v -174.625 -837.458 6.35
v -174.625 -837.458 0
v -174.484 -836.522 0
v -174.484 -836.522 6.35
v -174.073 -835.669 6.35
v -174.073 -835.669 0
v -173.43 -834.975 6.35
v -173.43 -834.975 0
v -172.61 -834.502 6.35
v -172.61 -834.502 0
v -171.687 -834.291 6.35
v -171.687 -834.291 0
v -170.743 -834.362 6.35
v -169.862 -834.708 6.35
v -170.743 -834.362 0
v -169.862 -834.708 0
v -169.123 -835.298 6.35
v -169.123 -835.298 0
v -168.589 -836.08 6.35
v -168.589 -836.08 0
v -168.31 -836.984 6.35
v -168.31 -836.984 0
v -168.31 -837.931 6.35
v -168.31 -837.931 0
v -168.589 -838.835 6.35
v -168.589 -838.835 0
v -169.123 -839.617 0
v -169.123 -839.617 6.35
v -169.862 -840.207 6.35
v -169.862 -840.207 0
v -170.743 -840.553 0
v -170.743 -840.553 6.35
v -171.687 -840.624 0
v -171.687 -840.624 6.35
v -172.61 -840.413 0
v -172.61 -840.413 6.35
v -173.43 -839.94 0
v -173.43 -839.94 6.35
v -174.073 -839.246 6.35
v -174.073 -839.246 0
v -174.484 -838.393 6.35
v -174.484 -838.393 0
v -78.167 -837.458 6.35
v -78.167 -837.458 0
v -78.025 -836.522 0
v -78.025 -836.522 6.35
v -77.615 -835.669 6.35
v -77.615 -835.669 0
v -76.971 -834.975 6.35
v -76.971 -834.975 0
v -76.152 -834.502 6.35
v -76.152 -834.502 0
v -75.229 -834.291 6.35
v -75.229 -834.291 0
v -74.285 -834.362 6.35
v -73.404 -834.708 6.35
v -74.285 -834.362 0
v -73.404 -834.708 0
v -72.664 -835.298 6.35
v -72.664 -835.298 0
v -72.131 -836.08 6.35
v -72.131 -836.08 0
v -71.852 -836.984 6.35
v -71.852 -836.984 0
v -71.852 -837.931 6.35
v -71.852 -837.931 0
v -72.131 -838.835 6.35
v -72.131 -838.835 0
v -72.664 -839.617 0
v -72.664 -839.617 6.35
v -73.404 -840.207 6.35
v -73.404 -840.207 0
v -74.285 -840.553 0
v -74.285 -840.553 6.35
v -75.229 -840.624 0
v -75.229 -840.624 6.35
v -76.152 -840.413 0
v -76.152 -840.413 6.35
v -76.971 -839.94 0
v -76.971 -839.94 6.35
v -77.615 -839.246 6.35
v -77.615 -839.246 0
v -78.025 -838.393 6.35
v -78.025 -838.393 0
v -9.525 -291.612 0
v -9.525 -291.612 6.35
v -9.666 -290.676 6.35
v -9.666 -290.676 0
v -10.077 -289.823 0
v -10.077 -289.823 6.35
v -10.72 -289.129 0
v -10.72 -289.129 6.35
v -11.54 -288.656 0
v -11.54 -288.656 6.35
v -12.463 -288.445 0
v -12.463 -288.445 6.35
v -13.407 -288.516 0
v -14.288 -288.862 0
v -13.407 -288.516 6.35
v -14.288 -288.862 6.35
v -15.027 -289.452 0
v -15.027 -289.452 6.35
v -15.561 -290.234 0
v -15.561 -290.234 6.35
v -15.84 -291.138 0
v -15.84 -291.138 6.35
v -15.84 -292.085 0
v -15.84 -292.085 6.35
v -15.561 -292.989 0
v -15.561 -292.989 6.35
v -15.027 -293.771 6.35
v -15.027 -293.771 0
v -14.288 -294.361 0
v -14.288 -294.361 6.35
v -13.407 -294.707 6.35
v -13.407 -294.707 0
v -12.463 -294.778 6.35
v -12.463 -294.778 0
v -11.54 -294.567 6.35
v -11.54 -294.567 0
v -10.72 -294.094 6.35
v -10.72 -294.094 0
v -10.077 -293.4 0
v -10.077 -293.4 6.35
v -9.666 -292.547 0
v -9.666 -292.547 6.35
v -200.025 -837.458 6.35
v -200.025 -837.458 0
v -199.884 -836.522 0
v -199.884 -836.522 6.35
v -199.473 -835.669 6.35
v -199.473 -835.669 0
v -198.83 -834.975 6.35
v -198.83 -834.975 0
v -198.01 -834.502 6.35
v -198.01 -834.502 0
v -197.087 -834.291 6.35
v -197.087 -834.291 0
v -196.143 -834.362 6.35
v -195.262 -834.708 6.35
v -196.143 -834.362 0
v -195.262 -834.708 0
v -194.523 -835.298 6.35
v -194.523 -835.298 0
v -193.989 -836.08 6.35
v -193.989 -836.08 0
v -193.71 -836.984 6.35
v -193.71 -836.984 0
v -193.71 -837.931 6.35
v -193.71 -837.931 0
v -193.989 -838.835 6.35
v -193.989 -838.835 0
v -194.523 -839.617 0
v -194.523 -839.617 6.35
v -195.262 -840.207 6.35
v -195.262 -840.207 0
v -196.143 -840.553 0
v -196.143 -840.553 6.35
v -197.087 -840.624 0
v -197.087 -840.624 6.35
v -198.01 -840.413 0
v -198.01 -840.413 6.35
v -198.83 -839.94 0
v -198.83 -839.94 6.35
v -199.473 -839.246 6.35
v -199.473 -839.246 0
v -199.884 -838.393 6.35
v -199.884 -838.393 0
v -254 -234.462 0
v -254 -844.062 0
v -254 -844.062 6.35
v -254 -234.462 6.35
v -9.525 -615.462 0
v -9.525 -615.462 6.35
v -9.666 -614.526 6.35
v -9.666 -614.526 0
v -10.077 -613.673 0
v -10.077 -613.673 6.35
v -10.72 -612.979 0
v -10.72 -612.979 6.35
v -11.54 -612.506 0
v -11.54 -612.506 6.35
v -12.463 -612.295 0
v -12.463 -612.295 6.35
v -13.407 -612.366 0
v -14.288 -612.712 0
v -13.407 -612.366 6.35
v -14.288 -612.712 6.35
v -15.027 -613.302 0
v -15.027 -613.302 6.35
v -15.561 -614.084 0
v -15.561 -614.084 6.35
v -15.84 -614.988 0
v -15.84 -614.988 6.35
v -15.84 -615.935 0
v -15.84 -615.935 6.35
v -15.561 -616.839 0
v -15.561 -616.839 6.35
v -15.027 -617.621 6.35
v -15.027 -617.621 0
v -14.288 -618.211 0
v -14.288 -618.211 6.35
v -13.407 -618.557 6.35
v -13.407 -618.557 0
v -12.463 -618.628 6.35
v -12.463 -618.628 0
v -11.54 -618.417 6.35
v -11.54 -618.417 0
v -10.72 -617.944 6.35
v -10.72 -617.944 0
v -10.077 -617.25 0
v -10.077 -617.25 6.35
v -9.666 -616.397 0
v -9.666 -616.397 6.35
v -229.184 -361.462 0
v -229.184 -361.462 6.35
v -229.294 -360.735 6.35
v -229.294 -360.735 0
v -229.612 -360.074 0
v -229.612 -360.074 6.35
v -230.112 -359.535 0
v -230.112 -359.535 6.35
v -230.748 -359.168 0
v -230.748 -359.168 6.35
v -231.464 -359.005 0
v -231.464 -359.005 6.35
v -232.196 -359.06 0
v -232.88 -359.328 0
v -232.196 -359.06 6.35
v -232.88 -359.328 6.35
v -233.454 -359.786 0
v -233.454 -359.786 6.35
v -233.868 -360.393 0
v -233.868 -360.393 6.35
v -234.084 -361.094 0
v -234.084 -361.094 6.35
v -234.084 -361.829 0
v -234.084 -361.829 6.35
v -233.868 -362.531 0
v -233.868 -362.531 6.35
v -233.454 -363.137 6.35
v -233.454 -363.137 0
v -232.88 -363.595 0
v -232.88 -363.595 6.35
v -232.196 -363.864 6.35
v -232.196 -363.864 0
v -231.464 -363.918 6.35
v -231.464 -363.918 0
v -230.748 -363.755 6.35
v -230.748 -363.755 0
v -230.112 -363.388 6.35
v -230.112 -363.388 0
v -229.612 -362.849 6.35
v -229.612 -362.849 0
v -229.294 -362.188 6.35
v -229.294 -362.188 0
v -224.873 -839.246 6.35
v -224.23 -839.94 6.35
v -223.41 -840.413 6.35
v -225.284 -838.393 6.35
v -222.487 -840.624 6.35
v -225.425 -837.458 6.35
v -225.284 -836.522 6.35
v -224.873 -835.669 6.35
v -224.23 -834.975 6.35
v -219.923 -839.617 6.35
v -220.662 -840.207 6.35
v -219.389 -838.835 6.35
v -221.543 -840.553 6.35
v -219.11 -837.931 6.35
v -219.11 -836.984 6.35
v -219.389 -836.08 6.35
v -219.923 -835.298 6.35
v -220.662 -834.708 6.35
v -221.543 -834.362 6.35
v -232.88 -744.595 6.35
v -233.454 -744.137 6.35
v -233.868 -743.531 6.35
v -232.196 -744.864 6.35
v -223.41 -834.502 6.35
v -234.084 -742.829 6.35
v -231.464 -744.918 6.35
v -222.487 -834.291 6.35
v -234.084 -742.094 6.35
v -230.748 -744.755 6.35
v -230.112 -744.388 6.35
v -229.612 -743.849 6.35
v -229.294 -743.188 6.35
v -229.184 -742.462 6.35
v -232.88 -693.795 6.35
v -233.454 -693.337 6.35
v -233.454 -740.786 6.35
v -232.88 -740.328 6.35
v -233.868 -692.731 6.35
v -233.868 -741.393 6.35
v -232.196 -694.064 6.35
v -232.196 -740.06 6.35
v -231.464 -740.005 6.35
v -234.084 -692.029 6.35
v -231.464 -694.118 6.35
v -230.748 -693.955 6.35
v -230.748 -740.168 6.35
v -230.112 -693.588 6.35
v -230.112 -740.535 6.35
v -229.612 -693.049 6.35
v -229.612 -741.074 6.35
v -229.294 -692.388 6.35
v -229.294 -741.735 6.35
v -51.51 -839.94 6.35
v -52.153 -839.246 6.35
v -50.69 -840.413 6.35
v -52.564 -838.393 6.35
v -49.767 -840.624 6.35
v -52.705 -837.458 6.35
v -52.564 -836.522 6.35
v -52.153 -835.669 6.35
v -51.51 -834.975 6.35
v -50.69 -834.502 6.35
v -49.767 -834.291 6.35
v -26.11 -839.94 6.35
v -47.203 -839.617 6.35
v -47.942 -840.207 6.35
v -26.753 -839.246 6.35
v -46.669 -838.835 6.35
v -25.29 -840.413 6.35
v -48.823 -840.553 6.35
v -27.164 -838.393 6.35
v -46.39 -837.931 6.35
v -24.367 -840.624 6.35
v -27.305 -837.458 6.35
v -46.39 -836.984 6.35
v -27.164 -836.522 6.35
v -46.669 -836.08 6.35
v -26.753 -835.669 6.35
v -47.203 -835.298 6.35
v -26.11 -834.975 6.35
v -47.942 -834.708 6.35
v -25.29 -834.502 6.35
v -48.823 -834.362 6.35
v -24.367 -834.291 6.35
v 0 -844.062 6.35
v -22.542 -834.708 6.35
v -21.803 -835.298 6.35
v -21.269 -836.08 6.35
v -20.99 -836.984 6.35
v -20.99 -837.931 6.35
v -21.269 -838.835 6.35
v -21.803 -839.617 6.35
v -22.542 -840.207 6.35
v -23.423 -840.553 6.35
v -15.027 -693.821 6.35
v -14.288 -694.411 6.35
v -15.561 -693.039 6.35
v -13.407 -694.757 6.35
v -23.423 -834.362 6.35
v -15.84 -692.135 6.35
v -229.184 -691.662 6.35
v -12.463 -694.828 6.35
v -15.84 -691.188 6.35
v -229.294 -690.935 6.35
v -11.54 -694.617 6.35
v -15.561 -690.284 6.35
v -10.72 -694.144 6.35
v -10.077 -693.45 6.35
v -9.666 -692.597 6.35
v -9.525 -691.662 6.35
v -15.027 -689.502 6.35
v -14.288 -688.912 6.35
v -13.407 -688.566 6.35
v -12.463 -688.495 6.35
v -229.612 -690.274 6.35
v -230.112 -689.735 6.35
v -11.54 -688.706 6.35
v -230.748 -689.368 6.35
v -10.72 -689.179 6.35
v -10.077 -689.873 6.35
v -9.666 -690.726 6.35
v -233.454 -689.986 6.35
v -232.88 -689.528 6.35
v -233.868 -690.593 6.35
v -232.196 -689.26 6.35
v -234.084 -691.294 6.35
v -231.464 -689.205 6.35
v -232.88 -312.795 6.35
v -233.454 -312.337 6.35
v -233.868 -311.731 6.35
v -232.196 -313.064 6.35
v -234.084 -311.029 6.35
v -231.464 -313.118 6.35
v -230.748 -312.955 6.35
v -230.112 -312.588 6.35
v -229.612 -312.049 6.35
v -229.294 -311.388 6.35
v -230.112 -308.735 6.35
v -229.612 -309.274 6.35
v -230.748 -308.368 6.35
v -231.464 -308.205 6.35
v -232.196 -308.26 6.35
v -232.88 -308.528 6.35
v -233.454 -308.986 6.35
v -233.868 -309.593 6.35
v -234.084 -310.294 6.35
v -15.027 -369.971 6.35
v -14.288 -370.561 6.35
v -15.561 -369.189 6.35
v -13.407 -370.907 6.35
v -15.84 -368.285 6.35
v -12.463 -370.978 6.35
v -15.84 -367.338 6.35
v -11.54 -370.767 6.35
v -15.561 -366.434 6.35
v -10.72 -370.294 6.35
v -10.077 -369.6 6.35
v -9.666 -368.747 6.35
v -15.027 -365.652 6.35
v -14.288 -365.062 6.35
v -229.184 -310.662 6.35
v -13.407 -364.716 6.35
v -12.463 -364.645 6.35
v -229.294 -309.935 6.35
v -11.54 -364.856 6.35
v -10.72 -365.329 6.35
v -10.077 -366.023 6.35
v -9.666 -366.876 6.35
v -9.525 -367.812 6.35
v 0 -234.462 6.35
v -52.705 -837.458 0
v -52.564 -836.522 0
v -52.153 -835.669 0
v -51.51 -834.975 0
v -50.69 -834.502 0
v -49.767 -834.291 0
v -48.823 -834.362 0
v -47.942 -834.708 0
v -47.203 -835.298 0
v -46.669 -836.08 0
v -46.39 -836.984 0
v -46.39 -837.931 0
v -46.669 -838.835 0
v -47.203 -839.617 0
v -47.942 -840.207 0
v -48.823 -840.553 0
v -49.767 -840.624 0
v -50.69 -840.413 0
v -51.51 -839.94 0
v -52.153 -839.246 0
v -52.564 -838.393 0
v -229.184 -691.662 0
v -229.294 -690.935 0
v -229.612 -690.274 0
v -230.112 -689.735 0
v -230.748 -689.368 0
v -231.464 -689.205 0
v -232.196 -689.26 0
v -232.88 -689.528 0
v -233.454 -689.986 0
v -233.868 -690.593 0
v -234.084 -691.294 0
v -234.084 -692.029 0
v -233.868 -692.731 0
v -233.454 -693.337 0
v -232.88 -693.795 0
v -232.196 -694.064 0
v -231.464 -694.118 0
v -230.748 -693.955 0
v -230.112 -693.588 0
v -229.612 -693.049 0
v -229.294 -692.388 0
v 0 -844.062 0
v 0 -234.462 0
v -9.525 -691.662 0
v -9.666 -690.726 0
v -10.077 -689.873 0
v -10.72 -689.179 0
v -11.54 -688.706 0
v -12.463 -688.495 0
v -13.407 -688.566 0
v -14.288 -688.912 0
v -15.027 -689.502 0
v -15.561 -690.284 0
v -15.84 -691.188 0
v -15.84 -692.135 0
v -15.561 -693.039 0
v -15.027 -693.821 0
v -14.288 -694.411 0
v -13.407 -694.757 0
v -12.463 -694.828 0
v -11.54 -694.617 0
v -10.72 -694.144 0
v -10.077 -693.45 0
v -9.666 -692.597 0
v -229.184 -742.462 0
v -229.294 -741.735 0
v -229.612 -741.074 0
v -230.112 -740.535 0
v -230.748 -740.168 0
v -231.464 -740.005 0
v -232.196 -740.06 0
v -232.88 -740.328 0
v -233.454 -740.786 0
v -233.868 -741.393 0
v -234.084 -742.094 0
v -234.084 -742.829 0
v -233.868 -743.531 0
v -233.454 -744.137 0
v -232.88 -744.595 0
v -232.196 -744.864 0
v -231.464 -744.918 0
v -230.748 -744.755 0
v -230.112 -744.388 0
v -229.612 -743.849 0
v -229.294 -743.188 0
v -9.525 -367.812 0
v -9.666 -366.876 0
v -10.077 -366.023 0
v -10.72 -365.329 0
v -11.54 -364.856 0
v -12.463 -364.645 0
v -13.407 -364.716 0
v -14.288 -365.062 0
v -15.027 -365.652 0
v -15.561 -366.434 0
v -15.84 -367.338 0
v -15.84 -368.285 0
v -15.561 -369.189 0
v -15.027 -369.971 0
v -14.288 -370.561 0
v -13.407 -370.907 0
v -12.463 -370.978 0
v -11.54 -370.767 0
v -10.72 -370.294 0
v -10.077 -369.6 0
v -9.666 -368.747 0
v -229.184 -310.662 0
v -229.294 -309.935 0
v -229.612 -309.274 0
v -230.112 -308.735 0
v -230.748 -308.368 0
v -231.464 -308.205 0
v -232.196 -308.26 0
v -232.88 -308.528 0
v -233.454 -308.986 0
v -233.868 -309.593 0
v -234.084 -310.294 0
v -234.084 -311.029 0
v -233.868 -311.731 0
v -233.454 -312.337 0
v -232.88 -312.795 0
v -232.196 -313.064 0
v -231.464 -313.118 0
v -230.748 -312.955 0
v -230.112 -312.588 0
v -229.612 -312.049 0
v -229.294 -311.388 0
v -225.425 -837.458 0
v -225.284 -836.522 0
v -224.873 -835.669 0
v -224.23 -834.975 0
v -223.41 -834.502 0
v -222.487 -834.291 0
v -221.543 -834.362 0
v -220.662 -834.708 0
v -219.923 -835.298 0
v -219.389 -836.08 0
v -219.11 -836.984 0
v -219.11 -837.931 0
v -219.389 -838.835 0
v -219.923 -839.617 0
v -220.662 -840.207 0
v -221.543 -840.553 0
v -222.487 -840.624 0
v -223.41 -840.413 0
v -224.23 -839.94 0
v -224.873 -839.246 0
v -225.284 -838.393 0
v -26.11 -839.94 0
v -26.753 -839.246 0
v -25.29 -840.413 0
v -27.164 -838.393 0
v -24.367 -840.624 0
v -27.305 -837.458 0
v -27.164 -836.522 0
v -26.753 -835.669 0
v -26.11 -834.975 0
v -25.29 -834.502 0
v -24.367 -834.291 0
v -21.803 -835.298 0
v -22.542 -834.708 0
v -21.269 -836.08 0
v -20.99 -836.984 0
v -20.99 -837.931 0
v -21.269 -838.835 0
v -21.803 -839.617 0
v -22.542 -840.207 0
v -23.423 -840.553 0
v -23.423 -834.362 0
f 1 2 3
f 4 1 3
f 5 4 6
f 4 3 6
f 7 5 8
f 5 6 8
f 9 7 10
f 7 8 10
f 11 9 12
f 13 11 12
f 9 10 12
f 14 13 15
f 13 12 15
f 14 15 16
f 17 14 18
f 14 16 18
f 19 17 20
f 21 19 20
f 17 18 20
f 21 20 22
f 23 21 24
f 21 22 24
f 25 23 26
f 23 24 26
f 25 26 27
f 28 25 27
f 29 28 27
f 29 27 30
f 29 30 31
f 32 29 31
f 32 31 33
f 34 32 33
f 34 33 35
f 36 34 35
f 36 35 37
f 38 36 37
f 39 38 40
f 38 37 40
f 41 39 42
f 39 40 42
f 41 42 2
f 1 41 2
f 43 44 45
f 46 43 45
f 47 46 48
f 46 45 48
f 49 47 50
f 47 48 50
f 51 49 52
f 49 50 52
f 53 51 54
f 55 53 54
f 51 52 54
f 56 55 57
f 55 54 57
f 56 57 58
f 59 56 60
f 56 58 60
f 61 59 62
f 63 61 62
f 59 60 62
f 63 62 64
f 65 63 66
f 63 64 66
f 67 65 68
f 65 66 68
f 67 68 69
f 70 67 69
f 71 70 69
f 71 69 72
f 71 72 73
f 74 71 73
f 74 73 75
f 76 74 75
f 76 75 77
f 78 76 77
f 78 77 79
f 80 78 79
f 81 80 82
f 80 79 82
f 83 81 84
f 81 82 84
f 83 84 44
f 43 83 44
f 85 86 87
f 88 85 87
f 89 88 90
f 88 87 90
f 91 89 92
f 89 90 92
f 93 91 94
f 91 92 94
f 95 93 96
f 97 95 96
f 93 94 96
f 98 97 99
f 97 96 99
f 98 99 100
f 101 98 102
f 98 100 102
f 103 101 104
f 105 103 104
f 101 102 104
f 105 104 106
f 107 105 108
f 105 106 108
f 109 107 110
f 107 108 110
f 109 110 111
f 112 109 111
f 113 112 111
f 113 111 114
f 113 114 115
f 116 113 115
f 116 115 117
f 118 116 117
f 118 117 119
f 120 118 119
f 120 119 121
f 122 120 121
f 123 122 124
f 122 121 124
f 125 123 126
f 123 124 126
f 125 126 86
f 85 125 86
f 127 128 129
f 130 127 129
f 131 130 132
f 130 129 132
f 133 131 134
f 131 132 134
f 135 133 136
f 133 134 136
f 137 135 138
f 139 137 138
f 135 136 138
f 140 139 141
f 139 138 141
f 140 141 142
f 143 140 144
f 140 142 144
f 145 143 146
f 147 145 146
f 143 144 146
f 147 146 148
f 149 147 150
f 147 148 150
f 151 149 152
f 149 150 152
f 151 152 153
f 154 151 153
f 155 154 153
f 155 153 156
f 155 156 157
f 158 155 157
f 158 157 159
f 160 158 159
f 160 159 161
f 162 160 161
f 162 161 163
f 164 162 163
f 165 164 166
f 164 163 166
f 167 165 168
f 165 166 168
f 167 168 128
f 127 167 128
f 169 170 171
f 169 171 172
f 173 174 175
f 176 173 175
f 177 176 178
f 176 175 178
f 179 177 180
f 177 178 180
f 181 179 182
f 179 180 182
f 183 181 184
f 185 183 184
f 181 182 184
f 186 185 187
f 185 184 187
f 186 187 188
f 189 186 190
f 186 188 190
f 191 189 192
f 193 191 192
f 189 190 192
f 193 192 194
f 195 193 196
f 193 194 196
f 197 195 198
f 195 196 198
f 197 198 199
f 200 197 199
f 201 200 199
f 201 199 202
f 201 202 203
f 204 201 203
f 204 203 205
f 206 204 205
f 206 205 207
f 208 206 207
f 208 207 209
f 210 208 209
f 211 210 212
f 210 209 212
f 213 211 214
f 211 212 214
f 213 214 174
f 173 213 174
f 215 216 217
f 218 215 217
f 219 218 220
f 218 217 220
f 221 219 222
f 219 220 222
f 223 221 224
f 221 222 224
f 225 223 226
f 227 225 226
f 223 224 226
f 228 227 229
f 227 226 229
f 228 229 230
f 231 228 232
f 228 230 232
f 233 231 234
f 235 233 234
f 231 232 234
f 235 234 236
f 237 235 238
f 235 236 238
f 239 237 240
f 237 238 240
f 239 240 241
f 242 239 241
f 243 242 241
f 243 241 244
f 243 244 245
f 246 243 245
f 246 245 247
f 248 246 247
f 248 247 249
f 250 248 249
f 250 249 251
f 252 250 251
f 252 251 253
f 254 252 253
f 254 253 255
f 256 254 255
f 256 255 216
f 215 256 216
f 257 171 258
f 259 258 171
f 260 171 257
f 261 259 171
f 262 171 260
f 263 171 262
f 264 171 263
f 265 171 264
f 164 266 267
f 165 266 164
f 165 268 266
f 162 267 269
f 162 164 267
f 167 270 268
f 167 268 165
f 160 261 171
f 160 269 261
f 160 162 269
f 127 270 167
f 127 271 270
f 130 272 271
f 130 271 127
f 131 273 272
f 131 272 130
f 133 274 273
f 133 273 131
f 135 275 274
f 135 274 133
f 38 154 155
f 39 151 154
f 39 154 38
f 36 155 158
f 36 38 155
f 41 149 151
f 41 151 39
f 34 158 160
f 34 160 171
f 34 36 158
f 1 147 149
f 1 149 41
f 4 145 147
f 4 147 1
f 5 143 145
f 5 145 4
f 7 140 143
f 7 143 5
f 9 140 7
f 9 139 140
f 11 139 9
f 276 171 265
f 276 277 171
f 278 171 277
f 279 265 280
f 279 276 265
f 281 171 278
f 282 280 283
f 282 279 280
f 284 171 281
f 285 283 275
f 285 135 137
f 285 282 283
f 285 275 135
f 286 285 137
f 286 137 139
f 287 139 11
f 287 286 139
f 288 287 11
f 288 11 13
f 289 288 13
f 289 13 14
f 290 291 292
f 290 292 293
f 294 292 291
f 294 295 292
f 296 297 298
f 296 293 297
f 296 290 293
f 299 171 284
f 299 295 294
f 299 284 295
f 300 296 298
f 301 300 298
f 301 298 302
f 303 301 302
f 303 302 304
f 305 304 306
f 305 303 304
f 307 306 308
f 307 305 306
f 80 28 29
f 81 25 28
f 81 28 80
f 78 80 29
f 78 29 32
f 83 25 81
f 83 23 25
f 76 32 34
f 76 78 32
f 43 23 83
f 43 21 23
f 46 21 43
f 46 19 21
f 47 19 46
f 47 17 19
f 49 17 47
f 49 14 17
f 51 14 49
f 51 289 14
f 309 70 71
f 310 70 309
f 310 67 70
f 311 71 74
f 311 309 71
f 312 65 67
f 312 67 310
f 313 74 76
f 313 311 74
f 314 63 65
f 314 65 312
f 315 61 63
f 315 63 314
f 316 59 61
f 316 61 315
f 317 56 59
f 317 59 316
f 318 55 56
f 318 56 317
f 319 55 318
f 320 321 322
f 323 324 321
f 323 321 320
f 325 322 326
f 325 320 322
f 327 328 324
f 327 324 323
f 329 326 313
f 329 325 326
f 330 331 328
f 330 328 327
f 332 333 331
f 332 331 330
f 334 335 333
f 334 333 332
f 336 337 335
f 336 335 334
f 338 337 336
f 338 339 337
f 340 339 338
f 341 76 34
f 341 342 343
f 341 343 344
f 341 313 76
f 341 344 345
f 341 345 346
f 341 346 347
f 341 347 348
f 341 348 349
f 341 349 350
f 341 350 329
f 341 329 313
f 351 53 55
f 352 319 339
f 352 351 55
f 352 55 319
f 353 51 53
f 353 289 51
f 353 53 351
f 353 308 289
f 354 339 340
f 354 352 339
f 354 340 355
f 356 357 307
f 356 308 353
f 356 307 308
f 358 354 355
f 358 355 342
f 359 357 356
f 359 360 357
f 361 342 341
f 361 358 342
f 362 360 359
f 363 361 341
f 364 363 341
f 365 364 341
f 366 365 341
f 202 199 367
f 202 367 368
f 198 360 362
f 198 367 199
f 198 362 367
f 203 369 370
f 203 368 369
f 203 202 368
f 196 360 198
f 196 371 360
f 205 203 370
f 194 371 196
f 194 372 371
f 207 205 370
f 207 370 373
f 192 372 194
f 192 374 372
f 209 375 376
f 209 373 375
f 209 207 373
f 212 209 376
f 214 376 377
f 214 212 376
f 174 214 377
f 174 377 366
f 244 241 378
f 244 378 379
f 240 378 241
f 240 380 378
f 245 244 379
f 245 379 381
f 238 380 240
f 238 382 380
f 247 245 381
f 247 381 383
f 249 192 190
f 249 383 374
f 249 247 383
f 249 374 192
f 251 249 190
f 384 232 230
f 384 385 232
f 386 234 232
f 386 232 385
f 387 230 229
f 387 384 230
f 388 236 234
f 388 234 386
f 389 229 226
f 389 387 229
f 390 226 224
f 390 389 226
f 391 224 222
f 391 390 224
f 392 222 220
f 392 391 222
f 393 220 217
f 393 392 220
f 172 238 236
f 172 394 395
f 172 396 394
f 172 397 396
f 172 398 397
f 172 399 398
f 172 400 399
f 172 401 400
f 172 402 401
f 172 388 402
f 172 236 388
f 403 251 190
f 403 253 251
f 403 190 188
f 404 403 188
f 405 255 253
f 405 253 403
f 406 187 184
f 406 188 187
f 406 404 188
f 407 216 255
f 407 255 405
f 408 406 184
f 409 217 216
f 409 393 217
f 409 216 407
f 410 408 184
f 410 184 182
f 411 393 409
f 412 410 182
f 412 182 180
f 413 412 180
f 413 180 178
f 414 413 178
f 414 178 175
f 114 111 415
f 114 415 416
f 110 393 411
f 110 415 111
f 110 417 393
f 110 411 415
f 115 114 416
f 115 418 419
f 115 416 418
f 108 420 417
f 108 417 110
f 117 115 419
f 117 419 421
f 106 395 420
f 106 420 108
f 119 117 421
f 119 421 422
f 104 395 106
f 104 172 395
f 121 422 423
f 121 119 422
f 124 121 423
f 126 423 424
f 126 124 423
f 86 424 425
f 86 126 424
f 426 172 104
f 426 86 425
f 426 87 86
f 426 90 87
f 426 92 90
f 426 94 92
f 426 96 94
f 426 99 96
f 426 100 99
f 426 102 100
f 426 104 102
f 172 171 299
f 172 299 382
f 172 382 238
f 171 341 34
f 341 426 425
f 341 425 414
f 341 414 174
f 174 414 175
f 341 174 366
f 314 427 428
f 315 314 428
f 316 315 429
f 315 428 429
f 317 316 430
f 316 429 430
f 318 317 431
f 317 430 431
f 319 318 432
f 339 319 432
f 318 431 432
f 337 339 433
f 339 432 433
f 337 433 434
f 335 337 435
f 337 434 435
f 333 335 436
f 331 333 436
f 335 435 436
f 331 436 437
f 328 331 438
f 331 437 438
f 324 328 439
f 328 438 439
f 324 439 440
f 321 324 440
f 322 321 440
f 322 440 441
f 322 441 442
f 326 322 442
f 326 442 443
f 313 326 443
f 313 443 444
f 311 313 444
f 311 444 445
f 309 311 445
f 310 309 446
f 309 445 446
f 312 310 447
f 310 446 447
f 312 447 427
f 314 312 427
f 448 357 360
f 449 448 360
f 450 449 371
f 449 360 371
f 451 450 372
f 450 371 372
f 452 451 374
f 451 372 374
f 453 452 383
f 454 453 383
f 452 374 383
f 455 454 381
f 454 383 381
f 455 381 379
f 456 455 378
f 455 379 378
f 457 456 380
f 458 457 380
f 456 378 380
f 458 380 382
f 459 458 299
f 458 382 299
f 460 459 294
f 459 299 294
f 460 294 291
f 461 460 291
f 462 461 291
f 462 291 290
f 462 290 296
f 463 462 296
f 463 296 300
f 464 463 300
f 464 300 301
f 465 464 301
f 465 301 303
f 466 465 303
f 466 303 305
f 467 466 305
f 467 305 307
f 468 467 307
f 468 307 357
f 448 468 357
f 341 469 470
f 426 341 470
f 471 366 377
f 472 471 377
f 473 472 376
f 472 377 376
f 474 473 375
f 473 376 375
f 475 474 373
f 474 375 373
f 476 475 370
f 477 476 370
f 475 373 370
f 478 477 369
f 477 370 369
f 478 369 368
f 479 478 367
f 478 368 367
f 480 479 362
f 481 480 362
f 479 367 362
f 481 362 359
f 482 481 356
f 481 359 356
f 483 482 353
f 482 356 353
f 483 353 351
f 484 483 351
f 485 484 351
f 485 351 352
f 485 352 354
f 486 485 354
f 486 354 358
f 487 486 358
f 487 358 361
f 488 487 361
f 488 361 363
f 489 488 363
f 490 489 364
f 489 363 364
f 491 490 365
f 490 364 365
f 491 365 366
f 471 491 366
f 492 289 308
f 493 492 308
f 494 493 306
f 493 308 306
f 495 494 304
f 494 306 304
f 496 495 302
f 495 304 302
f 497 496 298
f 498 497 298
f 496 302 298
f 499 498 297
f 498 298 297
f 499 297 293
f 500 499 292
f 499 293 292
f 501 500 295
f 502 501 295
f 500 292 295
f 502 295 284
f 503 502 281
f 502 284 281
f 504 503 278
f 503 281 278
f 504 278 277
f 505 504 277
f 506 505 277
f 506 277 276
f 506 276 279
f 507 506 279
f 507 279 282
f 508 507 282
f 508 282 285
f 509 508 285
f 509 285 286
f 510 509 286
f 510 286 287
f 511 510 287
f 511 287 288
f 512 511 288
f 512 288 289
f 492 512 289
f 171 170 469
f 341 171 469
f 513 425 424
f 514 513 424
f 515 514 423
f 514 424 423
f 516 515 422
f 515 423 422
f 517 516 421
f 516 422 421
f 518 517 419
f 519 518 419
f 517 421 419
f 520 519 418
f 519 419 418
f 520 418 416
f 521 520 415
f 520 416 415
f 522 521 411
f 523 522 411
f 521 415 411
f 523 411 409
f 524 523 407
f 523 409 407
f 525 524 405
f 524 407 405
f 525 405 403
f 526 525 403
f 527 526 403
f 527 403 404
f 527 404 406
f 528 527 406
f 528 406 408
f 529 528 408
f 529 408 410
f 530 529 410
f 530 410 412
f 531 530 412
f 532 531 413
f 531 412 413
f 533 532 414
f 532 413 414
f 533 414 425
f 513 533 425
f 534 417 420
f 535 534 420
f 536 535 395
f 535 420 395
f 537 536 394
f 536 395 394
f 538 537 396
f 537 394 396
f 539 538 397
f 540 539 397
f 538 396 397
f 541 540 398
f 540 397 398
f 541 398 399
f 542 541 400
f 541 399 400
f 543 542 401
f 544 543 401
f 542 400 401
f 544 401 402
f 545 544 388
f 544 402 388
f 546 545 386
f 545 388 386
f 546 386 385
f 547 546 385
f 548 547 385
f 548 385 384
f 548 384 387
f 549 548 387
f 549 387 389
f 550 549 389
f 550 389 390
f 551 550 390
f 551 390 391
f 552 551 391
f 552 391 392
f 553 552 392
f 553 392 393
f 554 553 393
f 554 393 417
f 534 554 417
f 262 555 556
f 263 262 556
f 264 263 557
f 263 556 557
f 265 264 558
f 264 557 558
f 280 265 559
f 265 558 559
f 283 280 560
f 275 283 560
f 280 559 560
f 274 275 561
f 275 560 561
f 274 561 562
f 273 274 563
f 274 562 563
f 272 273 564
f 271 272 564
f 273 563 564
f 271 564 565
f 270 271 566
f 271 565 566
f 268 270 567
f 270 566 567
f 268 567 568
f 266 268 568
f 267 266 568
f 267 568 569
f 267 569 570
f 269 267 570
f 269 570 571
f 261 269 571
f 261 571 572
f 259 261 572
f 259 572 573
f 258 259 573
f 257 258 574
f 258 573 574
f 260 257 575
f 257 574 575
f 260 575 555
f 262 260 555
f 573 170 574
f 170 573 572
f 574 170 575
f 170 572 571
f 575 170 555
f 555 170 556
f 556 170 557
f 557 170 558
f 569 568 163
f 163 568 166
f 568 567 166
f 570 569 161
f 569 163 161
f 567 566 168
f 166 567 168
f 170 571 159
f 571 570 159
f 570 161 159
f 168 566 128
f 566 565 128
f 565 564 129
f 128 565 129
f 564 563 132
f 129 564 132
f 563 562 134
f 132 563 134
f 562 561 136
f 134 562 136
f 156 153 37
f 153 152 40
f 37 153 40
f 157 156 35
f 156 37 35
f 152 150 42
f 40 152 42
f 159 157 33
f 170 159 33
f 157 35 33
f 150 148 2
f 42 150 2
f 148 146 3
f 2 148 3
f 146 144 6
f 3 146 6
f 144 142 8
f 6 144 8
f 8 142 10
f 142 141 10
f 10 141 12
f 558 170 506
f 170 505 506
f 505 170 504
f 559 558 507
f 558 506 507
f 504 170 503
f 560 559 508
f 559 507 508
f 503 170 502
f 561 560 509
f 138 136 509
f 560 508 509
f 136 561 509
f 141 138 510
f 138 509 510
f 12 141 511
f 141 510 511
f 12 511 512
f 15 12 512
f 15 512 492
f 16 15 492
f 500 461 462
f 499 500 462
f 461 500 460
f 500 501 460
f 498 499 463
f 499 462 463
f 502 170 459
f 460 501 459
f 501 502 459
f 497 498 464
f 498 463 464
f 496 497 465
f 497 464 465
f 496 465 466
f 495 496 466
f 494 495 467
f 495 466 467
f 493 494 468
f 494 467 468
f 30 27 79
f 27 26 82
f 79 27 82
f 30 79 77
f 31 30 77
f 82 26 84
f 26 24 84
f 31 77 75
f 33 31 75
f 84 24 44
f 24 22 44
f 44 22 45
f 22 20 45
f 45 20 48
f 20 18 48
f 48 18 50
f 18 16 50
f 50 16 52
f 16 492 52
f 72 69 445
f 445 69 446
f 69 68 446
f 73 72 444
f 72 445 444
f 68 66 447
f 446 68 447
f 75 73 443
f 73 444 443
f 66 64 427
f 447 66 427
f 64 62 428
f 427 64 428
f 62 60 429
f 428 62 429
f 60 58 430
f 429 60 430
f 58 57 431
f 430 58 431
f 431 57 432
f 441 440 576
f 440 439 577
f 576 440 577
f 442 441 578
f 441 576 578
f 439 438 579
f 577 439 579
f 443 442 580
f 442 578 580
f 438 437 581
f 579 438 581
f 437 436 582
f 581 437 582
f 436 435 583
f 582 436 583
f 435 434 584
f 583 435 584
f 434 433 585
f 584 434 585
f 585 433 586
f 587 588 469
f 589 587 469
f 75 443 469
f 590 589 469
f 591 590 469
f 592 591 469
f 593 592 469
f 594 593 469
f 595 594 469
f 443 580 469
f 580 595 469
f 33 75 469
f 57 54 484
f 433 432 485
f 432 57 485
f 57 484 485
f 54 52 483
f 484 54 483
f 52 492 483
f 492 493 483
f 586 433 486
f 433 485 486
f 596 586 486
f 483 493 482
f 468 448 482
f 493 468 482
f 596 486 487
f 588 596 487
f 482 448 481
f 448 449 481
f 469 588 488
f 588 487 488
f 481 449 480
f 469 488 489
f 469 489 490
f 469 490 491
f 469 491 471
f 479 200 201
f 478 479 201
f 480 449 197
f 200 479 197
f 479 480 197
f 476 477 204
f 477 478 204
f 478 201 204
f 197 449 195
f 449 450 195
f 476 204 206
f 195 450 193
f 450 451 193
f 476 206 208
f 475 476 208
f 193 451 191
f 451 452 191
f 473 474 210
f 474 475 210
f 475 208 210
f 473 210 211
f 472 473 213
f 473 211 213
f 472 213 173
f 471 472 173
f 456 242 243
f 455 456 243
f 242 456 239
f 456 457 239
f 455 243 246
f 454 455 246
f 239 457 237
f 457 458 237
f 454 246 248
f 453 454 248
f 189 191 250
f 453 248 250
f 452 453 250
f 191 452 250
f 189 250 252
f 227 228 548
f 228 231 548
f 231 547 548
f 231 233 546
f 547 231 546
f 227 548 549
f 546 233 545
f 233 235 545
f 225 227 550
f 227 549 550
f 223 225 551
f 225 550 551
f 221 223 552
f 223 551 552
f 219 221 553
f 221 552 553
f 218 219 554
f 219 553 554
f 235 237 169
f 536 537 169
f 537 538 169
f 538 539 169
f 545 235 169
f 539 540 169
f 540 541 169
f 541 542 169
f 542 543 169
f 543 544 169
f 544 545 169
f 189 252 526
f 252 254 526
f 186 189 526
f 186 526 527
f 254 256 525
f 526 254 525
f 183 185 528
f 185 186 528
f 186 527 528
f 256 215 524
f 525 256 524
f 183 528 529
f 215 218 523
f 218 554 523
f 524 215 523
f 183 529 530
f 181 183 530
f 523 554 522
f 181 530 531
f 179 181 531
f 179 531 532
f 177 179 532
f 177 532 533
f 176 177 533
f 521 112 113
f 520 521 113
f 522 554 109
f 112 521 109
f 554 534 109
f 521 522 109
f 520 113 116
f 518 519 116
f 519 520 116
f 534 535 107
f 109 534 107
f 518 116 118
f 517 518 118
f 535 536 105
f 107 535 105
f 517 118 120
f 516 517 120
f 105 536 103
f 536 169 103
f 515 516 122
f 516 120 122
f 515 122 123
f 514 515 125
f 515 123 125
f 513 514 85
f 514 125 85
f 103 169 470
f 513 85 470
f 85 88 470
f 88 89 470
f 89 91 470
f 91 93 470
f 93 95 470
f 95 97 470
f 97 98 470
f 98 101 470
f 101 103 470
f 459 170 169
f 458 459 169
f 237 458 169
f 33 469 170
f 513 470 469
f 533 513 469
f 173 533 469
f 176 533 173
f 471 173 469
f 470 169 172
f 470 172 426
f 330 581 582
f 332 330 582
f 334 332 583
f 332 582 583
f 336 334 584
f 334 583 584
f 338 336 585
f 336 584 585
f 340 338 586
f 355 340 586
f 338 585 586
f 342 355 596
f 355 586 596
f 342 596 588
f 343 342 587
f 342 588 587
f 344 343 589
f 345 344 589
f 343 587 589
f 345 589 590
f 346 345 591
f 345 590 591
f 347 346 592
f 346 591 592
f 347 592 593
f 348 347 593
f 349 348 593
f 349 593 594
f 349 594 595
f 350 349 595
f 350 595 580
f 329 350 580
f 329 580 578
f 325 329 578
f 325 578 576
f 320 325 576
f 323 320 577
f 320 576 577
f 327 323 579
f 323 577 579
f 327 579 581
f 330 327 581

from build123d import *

# Parameters (mm, degrees)
SKETCH1_W           = 254
SKETCH1_H           = 609.6
BOSS_EXTRUDE1_DEPTH = 6.35
SKETCH2_R           = 2.4638
CUT_EXTRUDE1_DEPTH  = 7.35
SKETCH3_R           = 3.175
CUT_EXTRUDE2_DEPTH  = 6.35
SKETCH4_R           = 3.175
CUT_EXTRUDE3_DEPTH  = 6.35


with BuildPart() as part:
    # Sketch1 → Boss-Extrude1 (new body)
    with BuildSketch(Plane.XY):
        with Locations((-127, -539.261538462)):
            Rectangle(SKETCH1_W, SKETCH1_H)
    extrude(amount=BOSS_EXTRUDE1_DEPTH)

    # Sketch2 → Cut-Extrude1 (cut, through all)
    with BuildSketch(Plane.XY.offset(6.35)):
        with Locations((-231.648, -310.661538462)):
            Circle(SKETCH2_R)
        with Locations((-231.648, -361.461538462)):
            Circle(SKETCH2_R)
        with Locations((-231.648, -691.661538462)):
            Circle(SKETCH2_R)
        with Locations((-231.648, -742.461538462)):
            Circle(SKETCH2_R)
    extrude(amount=-CUT_EXTRUDE1_DEPTH, mode=Mode.SUBTRACT)

    # Sketch3 → Cut-Extrude2 (cut)
    with BuildSketch(Plane(origin=(0, 0, 0), x_dir=(-1, 0, 0), z_dir=(0, 0, -1))):
        with Locations((24.13, -837.457538462)):
            Circle(SKETCH3_R)
        with Locations((49.53, -837.457538462)):
            Circle(SKETCH3_R)
        with Locations((74.991555208, -837.457538462)):
            Circle(SKETCH3_R)
        with Locations((196.85, -837.457538462)):
            Circle(SKETCH3_R)
        with Locations((171.45, -837.457538462)):
            Circle(SKETCH3_R)
        with Locations((222.25, -837.457538462)):
            Circle(SKETCH3_R)
    extrude(amount=-CUT_EXTRUDE2_DEPTH, mode=Mode.SUBTRACT)

    # Sketch4 → Cut-Extrude3 (cut)
    with BuildSketch(Plane.XY.offset(6.35)):
        with Locations((-12.7, -291.611538462)):
            Circle(SKETCH4_R)
        with Locations((-12.7, -367.811538462)):
            Circle(SKETCH4_R)
        with Locations((-12.7, -691.661538462)):
            Circle(SKETCH4_R)
        with Locations((-12.7, -615.461538462)):
            Circle(SKETCH4_R)
    extrude(amount=-CUT_EXTRUDE3_DEPTH, mode=Mode.SUBTRACT)


solid = part.part
